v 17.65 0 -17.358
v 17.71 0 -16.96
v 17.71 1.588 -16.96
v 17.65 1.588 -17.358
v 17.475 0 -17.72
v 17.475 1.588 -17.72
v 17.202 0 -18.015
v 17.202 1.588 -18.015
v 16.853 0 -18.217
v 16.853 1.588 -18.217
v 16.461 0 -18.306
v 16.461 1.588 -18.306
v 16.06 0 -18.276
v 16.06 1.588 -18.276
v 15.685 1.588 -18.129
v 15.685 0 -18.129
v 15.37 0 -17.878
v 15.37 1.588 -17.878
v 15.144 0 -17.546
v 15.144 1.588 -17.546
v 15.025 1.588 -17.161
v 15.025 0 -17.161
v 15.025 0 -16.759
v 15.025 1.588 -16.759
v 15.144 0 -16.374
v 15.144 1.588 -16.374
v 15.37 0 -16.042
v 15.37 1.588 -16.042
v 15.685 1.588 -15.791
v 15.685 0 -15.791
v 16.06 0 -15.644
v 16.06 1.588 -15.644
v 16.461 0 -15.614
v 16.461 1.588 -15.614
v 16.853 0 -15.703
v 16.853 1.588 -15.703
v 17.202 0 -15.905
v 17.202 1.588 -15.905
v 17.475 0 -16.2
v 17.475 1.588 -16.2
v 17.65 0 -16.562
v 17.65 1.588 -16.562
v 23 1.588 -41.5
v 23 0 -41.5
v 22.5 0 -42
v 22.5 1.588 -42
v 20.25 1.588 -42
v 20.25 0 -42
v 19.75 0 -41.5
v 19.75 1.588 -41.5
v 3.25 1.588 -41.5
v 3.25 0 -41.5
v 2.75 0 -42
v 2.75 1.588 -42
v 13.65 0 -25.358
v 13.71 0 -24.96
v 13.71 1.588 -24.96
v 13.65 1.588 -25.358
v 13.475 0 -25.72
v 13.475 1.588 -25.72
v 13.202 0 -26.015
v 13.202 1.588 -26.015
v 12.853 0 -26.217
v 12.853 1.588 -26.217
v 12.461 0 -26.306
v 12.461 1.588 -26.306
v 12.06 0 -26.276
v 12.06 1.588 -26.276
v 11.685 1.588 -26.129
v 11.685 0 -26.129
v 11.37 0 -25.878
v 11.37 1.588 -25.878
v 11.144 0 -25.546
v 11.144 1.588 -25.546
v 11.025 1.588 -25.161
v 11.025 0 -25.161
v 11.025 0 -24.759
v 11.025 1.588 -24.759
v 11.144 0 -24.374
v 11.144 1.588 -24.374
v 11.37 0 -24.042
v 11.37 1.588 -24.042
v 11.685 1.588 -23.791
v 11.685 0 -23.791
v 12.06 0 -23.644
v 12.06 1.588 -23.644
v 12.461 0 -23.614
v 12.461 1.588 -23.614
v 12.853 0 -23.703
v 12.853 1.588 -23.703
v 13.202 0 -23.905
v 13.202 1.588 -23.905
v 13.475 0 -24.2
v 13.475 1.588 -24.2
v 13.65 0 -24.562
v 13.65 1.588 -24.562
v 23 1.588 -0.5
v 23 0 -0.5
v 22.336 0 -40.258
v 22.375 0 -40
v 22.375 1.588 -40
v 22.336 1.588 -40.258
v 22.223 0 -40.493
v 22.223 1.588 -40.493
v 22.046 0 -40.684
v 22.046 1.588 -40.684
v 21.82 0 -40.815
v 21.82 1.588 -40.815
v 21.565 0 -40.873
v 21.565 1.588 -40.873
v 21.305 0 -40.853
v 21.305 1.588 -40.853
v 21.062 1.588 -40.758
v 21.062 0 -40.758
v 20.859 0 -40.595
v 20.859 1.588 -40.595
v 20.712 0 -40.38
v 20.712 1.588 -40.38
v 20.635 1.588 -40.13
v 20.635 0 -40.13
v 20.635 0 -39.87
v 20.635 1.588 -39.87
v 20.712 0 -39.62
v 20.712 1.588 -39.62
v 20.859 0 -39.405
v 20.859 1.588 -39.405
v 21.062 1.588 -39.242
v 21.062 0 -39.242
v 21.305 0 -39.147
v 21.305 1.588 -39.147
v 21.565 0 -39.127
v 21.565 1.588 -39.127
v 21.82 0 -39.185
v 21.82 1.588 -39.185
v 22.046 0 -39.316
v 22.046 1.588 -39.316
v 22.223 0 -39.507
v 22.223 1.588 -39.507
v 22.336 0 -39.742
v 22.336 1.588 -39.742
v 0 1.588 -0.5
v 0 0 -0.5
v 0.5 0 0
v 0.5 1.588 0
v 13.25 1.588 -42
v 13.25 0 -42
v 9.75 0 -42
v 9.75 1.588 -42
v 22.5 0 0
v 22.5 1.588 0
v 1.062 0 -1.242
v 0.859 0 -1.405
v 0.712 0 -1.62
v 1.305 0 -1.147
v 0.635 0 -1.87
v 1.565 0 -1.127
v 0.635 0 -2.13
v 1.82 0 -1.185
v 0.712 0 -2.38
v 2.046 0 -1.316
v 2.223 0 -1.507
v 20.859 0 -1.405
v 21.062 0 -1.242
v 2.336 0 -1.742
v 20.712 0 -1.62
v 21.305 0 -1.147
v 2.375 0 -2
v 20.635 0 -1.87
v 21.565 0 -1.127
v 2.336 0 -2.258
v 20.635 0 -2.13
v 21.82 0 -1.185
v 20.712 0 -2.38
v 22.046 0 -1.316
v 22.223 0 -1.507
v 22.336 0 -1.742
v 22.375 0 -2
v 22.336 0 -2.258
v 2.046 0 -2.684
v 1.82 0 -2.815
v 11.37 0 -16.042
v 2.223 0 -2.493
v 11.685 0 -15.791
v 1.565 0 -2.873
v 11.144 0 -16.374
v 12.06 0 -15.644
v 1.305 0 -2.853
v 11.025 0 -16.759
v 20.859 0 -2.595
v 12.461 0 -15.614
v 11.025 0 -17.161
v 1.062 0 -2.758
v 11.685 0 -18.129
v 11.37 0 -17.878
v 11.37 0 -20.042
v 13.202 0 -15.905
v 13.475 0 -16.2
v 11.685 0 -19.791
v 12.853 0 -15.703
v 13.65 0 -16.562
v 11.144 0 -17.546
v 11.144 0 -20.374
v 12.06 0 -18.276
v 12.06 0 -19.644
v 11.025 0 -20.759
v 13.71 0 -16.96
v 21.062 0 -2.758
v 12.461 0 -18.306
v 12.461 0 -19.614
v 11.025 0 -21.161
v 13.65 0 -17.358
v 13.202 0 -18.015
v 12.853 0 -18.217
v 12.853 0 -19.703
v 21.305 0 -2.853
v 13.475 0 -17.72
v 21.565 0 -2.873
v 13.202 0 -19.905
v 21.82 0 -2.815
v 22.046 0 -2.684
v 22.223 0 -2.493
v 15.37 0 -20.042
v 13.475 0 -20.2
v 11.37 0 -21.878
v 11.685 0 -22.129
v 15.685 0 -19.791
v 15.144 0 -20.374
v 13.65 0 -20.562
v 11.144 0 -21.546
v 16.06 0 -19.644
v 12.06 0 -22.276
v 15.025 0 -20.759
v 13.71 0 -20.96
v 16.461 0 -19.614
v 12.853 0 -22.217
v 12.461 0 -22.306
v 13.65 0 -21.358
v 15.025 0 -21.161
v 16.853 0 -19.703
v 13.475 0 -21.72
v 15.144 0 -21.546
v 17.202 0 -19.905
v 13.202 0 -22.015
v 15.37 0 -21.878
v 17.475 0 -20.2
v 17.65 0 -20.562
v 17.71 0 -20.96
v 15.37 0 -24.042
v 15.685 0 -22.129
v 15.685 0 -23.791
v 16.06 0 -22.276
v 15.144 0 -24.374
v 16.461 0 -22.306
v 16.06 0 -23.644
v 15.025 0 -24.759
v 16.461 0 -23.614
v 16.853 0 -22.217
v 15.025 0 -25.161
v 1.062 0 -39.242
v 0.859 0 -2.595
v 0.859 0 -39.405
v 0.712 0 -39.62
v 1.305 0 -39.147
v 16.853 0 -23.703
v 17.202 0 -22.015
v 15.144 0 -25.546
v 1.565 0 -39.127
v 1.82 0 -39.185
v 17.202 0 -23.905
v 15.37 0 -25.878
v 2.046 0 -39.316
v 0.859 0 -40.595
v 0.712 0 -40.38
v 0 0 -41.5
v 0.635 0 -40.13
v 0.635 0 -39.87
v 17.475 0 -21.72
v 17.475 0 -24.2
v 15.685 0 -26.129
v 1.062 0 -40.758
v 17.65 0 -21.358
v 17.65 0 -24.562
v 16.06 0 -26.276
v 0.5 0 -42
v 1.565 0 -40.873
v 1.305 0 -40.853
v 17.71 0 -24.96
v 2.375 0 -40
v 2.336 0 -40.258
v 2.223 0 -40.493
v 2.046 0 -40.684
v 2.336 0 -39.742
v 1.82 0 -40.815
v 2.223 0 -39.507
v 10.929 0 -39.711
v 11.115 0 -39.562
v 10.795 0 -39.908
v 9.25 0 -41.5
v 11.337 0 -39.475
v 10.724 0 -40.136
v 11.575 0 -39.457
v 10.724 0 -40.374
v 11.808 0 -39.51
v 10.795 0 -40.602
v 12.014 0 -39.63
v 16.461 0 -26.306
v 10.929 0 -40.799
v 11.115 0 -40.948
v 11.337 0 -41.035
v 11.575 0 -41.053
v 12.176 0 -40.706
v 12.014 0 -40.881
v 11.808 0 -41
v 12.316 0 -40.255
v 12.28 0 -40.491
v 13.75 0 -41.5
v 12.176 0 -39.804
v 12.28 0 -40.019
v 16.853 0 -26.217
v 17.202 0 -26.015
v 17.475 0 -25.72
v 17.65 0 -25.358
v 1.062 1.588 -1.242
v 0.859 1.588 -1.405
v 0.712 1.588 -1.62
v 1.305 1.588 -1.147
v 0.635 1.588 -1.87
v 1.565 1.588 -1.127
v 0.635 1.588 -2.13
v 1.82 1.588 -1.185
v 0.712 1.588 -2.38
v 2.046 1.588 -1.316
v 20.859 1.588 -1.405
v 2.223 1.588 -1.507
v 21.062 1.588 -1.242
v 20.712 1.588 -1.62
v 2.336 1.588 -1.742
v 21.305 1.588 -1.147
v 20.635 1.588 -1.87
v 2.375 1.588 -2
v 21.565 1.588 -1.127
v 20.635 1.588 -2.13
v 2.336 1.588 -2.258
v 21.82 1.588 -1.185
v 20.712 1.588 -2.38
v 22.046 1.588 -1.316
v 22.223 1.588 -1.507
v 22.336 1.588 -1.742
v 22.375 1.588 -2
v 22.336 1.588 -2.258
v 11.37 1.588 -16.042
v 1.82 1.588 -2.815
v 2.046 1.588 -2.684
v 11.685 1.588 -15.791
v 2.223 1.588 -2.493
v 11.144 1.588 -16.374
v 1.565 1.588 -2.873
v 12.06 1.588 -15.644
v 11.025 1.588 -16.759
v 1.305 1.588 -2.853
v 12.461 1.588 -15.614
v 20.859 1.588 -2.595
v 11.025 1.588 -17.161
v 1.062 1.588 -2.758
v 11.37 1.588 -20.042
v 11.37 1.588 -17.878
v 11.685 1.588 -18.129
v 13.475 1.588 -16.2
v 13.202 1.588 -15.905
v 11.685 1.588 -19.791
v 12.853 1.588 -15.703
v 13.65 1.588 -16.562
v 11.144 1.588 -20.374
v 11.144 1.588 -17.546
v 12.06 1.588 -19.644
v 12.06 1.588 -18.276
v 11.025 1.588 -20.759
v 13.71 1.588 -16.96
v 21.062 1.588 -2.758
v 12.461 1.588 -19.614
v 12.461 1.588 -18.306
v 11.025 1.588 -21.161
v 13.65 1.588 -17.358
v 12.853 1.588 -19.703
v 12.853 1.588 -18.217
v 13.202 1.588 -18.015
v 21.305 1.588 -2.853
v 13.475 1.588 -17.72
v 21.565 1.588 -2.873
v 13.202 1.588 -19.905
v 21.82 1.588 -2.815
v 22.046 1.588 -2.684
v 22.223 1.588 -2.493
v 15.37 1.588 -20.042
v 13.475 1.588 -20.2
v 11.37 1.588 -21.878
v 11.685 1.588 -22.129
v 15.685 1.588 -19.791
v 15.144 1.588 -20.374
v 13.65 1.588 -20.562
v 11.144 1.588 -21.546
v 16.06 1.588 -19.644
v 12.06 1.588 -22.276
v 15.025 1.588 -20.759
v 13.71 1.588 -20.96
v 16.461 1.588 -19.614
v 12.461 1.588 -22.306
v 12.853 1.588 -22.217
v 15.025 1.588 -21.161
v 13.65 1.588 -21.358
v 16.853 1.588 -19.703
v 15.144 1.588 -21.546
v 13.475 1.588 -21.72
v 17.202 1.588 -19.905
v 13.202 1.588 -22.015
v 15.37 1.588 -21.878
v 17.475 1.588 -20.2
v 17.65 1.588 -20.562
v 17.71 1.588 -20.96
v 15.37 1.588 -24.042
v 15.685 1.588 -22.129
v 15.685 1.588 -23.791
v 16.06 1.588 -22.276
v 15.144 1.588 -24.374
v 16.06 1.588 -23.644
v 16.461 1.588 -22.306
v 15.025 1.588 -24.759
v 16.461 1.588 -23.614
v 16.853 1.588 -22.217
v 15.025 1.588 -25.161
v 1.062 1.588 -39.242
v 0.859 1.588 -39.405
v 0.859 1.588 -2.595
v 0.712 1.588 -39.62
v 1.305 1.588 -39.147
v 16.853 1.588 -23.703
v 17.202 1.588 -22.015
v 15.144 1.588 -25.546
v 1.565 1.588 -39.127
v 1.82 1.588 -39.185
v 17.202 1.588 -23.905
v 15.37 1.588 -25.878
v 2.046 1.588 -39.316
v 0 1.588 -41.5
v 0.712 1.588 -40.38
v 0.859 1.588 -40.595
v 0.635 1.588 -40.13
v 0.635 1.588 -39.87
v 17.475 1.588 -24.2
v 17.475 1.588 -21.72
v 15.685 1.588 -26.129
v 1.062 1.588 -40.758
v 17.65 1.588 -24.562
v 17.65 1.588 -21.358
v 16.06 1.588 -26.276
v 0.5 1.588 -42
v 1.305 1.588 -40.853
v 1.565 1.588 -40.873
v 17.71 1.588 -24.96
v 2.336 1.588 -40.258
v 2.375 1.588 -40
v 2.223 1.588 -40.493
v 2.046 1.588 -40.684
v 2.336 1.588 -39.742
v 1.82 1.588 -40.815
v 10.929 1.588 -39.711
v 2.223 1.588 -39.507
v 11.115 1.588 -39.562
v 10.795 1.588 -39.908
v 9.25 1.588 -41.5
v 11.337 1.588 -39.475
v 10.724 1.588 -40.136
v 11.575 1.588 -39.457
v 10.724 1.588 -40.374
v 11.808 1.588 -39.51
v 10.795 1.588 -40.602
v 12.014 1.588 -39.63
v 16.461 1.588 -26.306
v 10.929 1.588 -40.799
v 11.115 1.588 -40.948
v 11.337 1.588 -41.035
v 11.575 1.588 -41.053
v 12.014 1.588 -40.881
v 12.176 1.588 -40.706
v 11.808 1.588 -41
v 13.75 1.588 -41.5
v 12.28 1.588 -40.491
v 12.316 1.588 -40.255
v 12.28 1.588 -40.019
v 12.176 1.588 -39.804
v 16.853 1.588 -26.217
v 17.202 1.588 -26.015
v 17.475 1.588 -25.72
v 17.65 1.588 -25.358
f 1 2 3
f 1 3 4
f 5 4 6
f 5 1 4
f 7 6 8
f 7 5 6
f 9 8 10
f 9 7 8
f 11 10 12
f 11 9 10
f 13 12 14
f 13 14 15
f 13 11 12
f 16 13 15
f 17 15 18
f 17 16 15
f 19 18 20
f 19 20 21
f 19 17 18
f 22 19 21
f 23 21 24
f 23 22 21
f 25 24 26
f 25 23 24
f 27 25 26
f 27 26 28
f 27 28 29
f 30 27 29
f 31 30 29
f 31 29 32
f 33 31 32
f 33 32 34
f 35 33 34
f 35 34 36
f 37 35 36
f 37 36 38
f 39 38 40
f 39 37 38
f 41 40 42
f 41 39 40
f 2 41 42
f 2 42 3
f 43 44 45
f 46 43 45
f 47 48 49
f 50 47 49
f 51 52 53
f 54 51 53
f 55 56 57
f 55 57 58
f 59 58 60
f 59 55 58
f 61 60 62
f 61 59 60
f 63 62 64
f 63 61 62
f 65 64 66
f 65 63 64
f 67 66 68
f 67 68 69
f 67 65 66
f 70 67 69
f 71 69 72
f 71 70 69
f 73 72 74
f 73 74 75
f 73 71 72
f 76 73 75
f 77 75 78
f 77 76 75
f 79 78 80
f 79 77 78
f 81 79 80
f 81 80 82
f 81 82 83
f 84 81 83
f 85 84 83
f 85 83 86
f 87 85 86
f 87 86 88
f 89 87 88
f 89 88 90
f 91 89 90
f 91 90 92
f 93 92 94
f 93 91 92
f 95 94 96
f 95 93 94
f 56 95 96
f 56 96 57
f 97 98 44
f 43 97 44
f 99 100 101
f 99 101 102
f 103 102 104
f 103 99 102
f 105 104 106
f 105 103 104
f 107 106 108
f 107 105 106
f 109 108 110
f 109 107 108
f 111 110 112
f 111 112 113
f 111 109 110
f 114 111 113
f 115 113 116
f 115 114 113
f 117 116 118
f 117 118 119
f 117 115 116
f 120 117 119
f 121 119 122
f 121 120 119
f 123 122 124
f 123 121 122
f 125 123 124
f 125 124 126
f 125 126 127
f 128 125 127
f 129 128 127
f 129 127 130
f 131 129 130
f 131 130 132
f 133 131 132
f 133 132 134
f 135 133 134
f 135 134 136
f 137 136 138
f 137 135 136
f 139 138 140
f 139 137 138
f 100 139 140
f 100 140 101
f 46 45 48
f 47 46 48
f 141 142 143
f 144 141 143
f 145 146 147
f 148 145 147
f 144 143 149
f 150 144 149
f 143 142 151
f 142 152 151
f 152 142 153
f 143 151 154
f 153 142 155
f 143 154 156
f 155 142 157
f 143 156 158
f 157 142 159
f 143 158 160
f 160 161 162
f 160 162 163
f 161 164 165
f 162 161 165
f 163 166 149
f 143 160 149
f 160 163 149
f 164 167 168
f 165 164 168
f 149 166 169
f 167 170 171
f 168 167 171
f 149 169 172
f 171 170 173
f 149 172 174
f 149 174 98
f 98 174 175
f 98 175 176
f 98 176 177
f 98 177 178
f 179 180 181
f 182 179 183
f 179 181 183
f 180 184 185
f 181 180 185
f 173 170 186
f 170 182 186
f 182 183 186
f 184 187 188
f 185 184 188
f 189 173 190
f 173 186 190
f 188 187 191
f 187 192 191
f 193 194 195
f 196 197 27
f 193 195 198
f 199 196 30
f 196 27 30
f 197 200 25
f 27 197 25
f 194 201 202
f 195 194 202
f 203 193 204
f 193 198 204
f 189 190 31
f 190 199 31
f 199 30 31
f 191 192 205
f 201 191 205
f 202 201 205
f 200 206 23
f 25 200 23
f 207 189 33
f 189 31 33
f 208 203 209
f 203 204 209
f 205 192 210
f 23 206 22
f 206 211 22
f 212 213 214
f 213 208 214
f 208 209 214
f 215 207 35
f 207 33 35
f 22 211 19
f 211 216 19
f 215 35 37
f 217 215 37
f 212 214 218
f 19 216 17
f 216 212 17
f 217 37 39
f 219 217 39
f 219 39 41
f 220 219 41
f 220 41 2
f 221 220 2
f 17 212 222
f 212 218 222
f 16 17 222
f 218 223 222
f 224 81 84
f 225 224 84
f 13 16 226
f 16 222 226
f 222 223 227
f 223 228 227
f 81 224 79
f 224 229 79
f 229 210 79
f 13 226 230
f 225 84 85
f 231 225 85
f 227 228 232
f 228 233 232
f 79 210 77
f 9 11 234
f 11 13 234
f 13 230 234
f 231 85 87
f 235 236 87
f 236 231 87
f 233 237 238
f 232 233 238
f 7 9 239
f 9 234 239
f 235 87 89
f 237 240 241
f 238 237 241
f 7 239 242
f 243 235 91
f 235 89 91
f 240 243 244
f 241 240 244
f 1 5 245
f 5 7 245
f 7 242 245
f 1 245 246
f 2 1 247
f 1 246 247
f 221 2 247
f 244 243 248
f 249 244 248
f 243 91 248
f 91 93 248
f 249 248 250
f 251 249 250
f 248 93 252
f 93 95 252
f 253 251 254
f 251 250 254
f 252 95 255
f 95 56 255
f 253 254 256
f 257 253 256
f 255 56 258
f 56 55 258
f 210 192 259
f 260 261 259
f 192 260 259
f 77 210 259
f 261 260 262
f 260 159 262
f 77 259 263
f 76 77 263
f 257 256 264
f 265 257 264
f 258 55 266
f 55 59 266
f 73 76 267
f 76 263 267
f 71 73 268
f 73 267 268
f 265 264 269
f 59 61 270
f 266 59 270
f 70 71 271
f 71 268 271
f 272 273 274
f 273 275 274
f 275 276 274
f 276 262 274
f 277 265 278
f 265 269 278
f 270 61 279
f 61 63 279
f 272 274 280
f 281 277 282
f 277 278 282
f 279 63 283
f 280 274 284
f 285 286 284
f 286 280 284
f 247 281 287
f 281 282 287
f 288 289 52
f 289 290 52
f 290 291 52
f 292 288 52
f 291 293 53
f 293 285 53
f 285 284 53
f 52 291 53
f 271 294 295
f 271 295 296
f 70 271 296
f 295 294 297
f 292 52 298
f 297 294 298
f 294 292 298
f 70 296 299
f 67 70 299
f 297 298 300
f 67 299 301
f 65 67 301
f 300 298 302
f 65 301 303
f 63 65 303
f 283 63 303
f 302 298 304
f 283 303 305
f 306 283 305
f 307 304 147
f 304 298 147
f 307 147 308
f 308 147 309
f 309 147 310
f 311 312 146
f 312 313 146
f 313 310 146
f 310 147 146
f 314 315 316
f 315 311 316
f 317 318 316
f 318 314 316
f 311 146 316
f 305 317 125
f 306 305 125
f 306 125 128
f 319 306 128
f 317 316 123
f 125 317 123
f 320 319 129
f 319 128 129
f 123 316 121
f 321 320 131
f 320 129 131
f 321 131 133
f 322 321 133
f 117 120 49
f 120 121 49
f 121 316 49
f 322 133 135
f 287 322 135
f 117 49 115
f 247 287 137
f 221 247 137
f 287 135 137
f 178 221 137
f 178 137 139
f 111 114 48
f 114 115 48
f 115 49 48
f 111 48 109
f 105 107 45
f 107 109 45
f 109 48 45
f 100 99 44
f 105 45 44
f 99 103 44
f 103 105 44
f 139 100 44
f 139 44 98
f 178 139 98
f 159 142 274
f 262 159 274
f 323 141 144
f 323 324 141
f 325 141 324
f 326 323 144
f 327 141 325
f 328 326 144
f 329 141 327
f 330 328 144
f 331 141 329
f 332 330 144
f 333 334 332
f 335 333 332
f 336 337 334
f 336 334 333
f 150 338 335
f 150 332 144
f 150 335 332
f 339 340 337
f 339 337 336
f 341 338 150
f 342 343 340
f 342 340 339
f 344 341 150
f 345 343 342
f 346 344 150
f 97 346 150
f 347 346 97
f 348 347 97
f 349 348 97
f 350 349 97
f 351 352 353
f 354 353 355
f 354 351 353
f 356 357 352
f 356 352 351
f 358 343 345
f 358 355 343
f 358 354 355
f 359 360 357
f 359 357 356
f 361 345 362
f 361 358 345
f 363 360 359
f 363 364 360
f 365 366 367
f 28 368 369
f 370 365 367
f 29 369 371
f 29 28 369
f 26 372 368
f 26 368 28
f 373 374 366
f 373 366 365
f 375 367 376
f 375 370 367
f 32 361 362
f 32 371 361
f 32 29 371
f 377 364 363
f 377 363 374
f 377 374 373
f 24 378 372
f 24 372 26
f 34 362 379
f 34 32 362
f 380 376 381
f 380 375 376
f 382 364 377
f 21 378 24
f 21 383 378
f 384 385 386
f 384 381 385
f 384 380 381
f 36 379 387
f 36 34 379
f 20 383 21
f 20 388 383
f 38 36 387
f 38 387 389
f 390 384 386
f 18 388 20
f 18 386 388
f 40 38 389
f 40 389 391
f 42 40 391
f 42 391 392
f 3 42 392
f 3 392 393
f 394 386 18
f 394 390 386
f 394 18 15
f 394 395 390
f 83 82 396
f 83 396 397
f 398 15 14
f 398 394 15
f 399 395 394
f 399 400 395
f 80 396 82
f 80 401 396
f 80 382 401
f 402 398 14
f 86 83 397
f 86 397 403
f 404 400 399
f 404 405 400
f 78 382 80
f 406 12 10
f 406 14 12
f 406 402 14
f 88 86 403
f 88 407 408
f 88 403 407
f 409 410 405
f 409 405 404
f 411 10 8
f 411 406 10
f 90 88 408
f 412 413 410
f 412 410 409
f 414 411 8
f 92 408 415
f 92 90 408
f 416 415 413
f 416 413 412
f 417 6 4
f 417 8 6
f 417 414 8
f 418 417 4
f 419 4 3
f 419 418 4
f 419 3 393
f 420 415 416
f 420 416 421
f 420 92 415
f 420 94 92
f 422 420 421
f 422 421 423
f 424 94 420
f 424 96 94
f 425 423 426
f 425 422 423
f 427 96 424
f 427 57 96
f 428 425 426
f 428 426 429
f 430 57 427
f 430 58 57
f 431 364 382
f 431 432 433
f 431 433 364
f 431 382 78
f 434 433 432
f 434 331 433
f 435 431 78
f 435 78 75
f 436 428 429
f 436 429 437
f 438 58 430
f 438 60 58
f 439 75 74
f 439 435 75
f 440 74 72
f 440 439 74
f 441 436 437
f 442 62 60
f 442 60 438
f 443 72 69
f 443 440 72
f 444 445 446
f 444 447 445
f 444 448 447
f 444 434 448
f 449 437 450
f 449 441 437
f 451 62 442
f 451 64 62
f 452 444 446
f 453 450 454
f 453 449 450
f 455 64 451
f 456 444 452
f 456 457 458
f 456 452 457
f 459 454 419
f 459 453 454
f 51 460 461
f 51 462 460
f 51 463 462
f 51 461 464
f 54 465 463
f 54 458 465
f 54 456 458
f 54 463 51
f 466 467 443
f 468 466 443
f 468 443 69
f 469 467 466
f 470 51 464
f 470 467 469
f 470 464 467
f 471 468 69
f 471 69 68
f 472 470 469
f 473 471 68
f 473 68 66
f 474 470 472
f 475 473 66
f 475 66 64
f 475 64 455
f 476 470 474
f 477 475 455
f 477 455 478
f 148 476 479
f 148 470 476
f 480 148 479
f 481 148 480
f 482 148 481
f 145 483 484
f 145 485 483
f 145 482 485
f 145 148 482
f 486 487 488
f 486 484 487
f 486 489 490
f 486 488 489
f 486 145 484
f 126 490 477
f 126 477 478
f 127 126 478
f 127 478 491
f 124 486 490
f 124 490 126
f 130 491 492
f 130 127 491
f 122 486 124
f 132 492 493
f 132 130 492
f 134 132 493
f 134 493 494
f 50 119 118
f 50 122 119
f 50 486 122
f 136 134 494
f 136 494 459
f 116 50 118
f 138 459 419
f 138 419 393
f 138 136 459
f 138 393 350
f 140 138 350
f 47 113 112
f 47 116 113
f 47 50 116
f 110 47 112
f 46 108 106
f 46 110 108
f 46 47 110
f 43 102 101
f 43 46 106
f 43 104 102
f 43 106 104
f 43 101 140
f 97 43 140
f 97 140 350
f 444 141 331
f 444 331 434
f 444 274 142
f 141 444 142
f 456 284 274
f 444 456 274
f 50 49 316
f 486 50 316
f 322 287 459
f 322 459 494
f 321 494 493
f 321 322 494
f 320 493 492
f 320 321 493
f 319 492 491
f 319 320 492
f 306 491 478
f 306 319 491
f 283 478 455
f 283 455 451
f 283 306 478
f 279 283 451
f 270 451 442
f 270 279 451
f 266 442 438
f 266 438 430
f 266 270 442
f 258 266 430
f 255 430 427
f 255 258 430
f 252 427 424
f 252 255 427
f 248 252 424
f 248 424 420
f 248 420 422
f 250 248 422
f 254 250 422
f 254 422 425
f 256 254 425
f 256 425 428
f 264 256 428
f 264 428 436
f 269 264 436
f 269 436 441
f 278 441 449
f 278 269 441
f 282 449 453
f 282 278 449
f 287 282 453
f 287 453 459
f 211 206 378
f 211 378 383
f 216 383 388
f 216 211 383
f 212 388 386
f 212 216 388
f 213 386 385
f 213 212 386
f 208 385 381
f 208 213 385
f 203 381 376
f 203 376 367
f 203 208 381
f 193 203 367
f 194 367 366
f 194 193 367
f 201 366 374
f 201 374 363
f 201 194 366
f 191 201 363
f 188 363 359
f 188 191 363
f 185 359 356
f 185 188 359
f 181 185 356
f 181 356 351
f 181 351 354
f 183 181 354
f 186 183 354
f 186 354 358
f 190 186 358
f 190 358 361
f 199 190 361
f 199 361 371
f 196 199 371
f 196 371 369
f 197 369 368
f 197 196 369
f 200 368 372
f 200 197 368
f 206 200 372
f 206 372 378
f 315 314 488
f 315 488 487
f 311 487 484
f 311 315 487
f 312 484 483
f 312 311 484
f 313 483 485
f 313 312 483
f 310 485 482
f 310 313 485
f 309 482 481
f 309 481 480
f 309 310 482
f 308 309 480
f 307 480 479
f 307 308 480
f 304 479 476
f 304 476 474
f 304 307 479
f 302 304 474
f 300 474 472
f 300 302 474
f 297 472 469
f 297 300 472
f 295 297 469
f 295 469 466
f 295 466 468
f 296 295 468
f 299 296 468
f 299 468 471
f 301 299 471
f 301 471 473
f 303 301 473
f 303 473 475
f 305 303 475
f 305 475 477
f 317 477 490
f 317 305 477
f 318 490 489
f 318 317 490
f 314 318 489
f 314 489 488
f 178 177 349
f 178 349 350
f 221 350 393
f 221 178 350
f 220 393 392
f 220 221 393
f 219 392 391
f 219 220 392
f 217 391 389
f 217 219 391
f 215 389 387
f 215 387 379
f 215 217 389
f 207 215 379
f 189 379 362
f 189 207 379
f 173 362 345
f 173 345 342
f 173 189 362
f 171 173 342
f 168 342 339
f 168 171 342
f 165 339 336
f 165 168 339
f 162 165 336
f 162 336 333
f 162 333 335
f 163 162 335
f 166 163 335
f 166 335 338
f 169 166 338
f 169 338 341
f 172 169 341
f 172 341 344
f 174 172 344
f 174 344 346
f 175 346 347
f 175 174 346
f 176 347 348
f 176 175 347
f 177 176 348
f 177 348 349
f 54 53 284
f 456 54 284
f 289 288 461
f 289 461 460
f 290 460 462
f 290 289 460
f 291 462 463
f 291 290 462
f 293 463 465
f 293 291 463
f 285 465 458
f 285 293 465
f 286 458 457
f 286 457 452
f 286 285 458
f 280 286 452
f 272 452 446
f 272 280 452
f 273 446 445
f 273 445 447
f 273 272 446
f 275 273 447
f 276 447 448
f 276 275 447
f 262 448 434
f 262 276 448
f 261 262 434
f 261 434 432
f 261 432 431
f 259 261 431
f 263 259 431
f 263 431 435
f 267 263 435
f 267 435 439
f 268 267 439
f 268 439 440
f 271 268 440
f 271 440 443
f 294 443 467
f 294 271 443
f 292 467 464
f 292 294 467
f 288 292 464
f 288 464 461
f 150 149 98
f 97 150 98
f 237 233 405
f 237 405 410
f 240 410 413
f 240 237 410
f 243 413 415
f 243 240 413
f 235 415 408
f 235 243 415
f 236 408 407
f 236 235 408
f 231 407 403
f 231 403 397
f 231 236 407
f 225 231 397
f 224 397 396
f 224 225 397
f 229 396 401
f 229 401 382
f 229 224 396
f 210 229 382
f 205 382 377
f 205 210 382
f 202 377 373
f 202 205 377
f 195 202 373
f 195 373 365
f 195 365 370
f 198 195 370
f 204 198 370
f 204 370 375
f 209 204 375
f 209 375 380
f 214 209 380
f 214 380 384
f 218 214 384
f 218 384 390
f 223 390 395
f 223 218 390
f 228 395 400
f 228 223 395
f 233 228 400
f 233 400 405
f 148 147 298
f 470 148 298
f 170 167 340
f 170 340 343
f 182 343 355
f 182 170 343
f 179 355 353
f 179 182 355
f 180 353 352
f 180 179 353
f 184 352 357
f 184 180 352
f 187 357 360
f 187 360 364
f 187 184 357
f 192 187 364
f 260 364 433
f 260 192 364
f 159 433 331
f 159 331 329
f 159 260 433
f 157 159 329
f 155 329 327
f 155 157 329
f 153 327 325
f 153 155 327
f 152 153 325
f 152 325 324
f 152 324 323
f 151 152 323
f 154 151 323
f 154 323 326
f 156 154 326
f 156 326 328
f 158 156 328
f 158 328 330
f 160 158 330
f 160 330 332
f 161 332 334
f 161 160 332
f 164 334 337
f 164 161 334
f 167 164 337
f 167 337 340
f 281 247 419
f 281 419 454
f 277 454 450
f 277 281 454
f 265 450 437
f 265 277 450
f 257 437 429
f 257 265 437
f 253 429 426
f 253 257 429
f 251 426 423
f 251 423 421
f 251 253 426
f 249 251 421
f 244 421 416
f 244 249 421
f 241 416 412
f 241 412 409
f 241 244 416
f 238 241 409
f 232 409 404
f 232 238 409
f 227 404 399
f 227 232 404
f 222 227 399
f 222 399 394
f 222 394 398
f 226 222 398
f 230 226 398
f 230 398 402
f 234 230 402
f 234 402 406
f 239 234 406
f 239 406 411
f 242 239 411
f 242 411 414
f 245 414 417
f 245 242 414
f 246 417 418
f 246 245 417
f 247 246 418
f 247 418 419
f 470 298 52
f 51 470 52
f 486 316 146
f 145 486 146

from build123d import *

# Parameters (mm, degrees)
SKETCH1_R           = 1.35
SKETCH1_R_2         = 0.875
SKETCH1_R_3         = 0.8001
BOSS_EXTRUDE1_DEPTH = 1.5875


with BuildPart() as part:
    # Sketch1 → Boss-Extrude1 (new body)
    with BuildSketch(Plane(origin=(0, 0, 0), x_dir=(1, 0, 0), z_dir=(0, 1, 0))):
        Polygon((22.5, 0), (23, 0.5), (23, 41.5), (22.5, 42), (20.25, 42), (19.75, 41.5), (13.75, 41.5), (13.25, 42), (9.75, 42), (9.25, 41.5), (3.25, 41.5), (2.75, 42), (0.5, 42), (0, 41.5), (0, 0.5), (0.5, 0), align=None)
        with Locations((12.36, 16.96)):
            Circle(SKETCH1_R, mode=Mode.SUBTRACT)
        with Locations((16.36, 16.96)):
            Circle(SKETCH1_R, mode=Mode.SUBTRACT)
        with Locations((12.36, 20.96)):
            Circle(SKETCH1_R, mode=Mode.SUBTRACT)
        with Locations((16.36, 20.96)):
            Circle(SKETCH1_R, mode=Mode.SUBTRACT)
        with Locations((12.36, 24.96)):
            Circle(SKETCH1_R, mode=Mode.SUBTRACT)
        with Locations((16.36, 24.96)):
            Circle(SKETCH1_R, mode=Mode.SUBTRACT)
        with Locations((21.5, 40)):
            Circle(SKETCH1_R_2, mode=Mode.SUBTRACT)
        with Locations((21.5, 2)):
            Circle(SKETCH1_R_2, mode=Mode.SUBTRACT)
        with Locations((1.5, 2)):
            Circle(SKETCH1_R_2, mode=Mode.SUBTRACT)
        with Locations((1.5, 40)):
            Circle(SKETCH1_R_2, mode=Mode.SUBTRACT)
        with Locations((11.5154, 40.2552)):
            Circle(SKETCH1_R_3, mode=Mode.SUBTRACT)
    extrude(amount=BOSS_EXTRUDE1_DEPTH)


solid = part.part
